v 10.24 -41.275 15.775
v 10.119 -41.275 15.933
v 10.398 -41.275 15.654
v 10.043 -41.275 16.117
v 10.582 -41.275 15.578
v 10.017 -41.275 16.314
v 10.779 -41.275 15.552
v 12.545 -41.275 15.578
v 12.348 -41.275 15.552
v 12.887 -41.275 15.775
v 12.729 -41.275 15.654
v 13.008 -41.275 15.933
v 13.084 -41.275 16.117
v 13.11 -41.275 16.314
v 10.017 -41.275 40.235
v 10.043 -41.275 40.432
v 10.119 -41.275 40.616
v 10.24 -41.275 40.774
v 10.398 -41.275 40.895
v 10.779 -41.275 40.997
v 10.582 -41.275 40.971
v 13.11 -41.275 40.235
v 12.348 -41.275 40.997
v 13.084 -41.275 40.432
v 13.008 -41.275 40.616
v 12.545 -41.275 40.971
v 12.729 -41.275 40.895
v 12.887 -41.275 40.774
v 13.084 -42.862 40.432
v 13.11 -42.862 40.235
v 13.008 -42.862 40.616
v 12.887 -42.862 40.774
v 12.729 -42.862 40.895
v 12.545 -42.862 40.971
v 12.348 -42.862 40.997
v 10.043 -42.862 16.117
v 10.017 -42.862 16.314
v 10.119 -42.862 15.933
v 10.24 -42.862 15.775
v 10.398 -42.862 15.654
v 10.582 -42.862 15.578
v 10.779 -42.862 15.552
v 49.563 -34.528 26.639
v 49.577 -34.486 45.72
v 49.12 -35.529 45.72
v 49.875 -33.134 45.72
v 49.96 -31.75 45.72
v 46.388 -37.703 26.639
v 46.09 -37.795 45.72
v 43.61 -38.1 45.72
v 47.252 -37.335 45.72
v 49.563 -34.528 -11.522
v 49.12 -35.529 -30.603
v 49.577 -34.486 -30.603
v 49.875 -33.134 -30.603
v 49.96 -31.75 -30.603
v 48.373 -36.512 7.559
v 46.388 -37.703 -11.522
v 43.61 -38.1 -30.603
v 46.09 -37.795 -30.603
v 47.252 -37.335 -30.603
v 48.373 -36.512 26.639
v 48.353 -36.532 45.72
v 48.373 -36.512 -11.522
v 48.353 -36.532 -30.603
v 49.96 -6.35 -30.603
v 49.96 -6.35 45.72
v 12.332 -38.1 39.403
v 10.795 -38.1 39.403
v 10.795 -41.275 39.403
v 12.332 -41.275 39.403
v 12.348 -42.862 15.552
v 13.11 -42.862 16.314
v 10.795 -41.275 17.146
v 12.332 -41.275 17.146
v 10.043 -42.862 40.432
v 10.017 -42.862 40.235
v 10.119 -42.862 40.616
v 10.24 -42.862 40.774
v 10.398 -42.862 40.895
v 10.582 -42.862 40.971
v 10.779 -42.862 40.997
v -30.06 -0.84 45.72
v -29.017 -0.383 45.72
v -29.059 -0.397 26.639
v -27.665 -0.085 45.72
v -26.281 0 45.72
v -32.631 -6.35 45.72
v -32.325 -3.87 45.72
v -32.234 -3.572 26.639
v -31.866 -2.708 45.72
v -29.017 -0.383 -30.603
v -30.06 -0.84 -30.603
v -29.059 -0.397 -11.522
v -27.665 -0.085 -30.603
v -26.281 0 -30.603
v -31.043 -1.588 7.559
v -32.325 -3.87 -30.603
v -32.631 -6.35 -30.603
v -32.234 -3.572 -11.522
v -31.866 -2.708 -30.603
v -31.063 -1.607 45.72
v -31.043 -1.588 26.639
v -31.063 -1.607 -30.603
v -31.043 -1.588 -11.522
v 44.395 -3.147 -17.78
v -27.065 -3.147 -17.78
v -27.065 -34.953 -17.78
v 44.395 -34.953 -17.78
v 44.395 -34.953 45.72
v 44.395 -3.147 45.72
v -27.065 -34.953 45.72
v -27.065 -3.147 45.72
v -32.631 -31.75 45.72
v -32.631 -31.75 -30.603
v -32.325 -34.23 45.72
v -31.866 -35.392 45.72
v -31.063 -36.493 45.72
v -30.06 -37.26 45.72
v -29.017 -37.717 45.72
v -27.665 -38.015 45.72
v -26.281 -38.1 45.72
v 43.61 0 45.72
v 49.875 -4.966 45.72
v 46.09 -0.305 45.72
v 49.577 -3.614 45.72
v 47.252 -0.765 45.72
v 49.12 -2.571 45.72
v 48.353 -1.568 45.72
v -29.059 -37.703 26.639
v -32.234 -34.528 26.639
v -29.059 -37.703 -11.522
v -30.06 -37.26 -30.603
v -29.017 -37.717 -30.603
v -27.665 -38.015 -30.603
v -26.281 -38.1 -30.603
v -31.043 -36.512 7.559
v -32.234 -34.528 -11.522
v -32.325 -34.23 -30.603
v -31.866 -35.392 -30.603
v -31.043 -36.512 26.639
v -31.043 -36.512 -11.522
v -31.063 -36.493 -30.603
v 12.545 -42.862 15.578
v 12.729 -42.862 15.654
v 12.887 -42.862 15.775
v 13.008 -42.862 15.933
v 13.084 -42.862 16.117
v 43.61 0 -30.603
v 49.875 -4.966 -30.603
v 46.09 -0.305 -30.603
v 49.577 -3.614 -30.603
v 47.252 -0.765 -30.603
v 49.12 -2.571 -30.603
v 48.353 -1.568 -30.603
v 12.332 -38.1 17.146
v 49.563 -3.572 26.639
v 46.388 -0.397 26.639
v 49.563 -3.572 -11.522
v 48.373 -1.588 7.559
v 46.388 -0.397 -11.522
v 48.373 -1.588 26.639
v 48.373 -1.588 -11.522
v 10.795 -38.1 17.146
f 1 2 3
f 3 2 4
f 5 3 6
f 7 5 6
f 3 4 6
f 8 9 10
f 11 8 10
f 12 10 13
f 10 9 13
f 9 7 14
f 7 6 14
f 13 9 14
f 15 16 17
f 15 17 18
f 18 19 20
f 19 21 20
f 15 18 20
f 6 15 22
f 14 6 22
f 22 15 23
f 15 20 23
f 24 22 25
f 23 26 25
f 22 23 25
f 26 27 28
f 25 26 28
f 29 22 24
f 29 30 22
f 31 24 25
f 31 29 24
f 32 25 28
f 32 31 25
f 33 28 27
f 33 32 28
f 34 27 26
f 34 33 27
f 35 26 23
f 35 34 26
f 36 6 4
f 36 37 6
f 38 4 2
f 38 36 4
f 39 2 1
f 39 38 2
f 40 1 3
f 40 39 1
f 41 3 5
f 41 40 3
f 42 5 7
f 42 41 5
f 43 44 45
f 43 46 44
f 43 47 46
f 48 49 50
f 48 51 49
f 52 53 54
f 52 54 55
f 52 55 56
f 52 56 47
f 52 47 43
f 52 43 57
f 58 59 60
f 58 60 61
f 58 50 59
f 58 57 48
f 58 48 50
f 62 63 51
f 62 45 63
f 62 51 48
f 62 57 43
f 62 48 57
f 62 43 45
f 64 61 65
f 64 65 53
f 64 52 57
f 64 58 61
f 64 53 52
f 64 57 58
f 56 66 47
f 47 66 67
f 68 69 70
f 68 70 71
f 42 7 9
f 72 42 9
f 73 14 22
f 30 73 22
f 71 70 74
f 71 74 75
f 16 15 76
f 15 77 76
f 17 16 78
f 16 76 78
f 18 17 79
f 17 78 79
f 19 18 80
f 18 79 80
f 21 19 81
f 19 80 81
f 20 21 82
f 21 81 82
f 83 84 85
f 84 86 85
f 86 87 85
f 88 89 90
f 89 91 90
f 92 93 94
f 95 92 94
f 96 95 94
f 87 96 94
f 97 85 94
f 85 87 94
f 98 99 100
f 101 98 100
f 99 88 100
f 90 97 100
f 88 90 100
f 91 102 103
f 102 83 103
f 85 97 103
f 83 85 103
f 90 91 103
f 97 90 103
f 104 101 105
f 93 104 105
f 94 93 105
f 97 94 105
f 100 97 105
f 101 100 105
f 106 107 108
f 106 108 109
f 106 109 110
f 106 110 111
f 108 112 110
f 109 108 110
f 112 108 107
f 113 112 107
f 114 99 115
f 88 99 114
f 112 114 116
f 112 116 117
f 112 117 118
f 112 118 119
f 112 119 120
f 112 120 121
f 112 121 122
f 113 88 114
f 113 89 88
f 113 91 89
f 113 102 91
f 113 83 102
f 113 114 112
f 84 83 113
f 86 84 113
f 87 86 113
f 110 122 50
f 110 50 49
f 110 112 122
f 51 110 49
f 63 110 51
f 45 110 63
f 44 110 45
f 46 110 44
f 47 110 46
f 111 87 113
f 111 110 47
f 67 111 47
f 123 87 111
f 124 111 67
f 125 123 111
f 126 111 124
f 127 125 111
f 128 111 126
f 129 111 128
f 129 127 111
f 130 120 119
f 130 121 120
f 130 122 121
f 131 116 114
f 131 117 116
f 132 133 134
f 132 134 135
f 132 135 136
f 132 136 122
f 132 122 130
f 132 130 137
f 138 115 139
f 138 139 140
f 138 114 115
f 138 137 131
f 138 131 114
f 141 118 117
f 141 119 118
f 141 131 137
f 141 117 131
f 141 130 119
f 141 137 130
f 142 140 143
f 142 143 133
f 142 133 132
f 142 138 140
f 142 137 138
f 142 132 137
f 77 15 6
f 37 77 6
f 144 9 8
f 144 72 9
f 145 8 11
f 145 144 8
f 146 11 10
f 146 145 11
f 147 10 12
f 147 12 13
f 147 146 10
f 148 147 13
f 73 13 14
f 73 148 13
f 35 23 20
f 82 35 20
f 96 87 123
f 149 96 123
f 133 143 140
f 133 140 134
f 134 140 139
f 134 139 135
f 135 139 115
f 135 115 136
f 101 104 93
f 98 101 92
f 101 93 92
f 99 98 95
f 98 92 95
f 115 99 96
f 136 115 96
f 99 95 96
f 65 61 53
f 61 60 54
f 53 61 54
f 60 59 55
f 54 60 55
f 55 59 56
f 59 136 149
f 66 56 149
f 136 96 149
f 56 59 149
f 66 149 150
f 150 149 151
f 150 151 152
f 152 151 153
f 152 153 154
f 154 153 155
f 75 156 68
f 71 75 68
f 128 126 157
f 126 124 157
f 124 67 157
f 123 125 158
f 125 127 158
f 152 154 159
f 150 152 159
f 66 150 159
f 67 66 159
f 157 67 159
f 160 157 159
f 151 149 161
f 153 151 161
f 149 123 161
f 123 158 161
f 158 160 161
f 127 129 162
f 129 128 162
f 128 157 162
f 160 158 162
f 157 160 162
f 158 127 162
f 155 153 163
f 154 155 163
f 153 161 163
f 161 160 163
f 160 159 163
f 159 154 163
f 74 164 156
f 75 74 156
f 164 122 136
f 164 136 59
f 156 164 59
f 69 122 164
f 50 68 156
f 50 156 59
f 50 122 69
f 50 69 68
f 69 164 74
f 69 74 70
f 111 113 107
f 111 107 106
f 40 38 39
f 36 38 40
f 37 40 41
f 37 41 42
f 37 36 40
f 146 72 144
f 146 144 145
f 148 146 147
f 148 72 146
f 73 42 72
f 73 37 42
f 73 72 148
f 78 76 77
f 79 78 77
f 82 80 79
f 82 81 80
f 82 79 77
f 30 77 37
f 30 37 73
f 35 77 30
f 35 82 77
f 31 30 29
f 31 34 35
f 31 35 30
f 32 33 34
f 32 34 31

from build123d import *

# Parameters (mm, degrees)
F0_W         = 82.5909674168
F0_H         = 76.3229075819
F1_DEPTH     = 25.4
F3_DEPTH     = 12.7
F4_W         = 71.4602097869
F4_H         = 31.8052172609
F5_DEPTH     = 63.5
F6_W         = 1.5378370881
F6_H         = 22.2577918321
F7_DEPTH     = 3.175
F9_DEPTH     = 1.5875
F10_R        = 0.762
F11_T1_DEPTH = 108.0729075819


# Not quite as in the source:
# - a fillet or chamfer that OpenCascade refuses, or shapes differently, is made with other operations: its cross-section is extruded or revolved along the edge and cut away or added
# - a length typed as a fraction of an inch, garbled in the dataset ("3 / 203.2 mm" for 3/8 in), is restored


with BuildPart() as f1:
    # F0 (on Front) → F1 (new body)
    with BuildSketch(Plane.XZ):
        with Locations((8.6646787822, 7.5585497543)):
            Rectangle(F0_W, F0_H)
    extrude(amount=F1_DEPTH)

    # F3 (add): a face of the model
    f3_faces = [f1.faces().sort_by_distance(p)[0] for p in [
        (8.6646787822, -25.4, 7.5585497543),
    ]]
    extrude(f3_faces, amount=F3_DEPTH)

    # F4 (on face) → F5 (cut)
    with BuildSketch(Plane.XY.offset(45.7200035453)):
        with Locations((8.6646787822, -19.05)):
            Rectangle(F4_W, F4_H)
    extrude(amount=-F5_DEPTH, mode=Mode.SUBTRACT)

    # F6 (on face) → F7 (join)
    with BuildSketch(Plane.XZ.offset(38.1)):
        with Locations((11.5634491667, 28.2745240256)):
            Rectangle(F6_W, F6_H)
    extrude(amount=F7_DEPTH)

    # F11: fillet of radius 6.35 on 4 edges, made by hand

    # F11_s2 → F11_t1 (cut)
    with BuildSketch(Plane.XY.offset(-46.4779040366)):
        with BuildLine():
            add(Edge.make_bspline(
                [(-26.2808049262, 0), (-32.6308049262, 0), (-32.6308049262, -6.35)],
                knots=[0, 0, 0, 1, 1, 1], degree=2, weights=[1, 1, 1]))
            Line((-32.6308049262, -6.35), (-32.6308049262, 0))
            Line((-32.6308049262, 0), (-26.2808049262, 0))
        make_face()
        with BuildLine():
            add(Edge.make_bspline(
                [(-26.2808049262, -38.1), (-32.6308049262, -38.1), (-32.6308049262, -31.75)],
                knots=[0, 0, 0, 1, 1, 1], degree=2, weights=[1, 1, 1]))
            Line((-32.6308049262, -31.75), (-32.6308049262, -38.1))
            Line((-32.6308049262, -38.1), (-26.2808049262, -38.1))
        make_face()
        with BuildLine():
            add(Edge.make_bspline(
                [(49.9601624906, -6.35), (49.9601624906, 0), (43.6101624906, 0)],
                knots=[0, 0, 0, 1, 1, 1], degree=2, weights=[1, 1, 1]))
            Line((43.6101624906, 0), (49.9601624906, 0))
            Line((49.9601624906, 0), (49.9601624906, -6.35))
        make_face()
        with BuildLine():
            add(Edge.make_bspline(
                [(49.9601624906, -31.75), (49.9601624906, -38.1), (43.6101624906, -38.1)],
                knots=[0, 0, 0, 1, 1, 1], degree=2, weights=[1, 1, 1]))
            Line((43.6101624906, -38.1), (49.9601624906, -38.1))
            Line((49.9601624906, -38.1), (49.9601624906, -31.75))
        make_face()
    extrude(amount=F11_T1_DEPTH, mode=Mode.SUBTRACT)


with BuildPart() as f9:
    # F8 (on face) → F9 (new body)
    with BuildSketch(Plane.XZ.offset(41.275)):
        Polygon((10.0171929225, 40.99727422), (10.0171929225, 39.4034199417), (10.0171929225, 17.1456281096), (10.0171929225, 15.5517738312), (13.1097054109, 15.5517738312), (13.1097054109, 17.1456281096), (13.1097054109, 39.4034199417), (13.1097054109, 40.99727422), align=None)
    extrude(amount=F9_DEPTH)

    # F10
    f10_edges = [f9.edges().sort_by_distance(p)[0] for p in [
        (13.109705, -42.06875, 40.997274),
        (10.017193, -42.06875, 40.997274),
        (13.109705, -42.06875, 15.551774),
        (10.017193, -42.06875, 15.551774),
    ]]
    fillet(f10_edges, radius=F10_R)


solid = Compound([f1.part, f9.part])
